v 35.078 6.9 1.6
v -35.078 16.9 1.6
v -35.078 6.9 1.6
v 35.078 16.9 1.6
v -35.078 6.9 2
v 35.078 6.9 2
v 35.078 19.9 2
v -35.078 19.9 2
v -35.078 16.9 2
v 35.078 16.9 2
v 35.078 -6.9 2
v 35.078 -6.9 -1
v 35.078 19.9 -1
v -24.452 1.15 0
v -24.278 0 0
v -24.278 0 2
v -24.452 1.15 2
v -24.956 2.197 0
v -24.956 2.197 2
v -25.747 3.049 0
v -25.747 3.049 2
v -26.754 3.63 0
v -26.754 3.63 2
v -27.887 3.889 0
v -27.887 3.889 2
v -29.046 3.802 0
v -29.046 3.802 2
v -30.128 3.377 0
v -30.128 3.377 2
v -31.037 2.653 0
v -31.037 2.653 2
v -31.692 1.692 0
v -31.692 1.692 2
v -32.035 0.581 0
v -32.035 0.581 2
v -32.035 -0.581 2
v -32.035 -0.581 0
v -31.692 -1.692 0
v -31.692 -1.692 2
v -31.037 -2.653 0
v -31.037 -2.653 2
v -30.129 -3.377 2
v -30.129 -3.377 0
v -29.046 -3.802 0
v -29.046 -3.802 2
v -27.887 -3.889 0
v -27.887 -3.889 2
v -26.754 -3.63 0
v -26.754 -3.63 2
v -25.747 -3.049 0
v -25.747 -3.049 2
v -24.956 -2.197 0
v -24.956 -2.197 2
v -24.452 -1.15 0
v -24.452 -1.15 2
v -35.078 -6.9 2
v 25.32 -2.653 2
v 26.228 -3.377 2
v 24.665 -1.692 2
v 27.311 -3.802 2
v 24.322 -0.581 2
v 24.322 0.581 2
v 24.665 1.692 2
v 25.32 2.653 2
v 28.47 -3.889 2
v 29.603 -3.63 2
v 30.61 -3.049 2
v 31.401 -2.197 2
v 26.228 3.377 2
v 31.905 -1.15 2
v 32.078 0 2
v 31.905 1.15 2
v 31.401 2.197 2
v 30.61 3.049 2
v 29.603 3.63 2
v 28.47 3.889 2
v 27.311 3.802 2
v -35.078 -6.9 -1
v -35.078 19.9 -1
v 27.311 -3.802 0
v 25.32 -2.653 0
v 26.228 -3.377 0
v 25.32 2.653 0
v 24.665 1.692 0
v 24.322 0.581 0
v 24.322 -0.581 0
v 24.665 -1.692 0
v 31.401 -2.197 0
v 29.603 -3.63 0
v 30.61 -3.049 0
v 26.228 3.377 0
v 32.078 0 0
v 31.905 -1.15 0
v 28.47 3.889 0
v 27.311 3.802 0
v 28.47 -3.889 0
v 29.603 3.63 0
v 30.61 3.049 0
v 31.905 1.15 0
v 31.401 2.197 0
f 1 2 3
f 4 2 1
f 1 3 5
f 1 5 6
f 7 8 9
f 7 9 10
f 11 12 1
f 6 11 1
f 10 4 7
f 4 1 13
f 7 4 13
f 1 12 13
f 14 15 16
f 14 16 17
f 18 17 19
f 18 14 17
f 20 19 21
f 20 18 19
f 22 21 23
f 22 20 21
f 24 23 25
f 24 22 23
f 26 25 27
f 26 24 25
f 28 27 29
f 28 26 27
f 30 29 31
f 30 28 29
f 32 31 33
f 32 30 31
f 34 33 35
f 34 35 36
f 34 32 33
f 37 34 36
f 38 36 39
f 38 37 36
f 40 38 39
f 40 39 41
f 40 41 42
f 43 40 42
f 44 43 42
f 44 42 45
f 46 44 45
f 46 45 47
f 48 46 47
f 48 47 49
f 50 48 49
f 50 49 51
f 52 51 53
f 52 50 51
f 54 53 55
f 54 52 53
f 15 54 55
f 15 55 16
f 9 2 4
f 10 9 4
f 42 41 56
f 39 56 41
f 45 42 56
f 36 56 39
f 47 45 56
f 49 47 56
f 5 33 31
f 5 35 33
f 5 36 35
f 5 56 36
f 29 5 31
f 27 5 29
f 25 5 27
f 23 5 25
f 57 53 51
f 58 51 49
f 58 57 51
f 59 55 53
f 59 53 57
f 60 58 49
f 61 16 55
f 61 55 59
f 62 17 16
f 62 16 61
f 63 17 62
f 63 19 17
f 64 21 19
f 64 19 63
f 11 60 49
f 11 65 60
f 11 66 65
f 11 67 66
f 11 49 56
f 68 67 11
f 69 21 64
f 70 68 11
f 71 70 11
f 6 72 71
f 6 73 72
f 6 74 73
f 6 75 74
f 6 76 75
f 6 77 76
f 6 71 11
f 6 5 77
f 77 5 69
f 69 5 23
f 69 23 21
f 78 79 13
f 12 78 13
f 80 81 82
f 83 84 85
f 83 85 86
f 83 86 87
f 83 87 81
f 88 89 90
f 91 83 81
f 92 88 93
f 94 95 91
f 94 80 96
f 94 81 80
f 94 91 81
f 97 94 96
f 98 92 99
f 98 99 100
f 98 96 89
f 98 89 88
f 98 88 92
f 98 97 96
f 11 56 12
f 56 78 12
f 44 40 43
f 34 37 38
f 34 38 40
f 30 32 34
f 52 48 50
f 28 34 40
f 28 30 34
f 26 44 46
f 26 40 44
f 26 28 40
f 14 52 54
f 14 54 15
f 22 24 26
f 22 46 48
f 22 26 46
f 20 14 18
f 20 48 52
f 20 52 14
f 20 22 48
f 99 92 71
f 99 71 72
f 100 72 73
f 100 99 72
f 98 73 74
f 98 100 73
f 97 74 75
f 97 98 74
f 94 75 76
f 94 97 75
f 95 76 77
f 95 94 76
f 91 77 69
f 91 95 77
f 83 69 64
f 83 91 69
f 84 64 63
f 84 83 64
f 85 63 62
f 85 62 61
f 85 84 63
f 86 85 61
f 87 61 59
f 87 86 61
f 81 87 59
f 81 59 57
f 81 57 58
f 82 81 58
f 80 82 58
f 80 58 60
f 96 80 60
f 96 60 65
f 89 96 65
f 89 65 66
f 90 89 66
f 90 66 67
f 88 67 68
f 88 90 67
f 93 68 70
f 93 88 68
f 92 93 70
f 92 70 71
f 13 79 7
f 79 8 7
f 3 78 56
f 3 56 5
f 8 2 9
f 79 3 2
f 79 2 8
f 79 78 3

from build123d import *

# Parameters (mm, degrees)
F1_W     = 70.157
F1_H     = 26.8
F2_DEPTH = 1
F0_W     = 70.157
F0_H     = 13.8
F0_R     = 3.9
F0_H_2   = 3
F3_DEPTH = 2
F0_H_3   = 10
F4_DEPTH = 1.6


with BuildPart() as f2:
    # F1 (on Top) → F2 (new body)
    with BuildSketch(Plane.XY):
        with Locations((0, 6.5)):
            Rectangle(F1_W, F1_H)
    extrude(amount=-F2_DEPTH)

    # F0 (on Top) → F3 (join)
    with BuildSketch(Plane.XY):
        Rectangle(F0_W, F0_H)
        with Locations((-28.1785, 0)):
            Circle(F0_R, mode=Mode.SUBTRACT)
        with Locations((28.1785, 0)):
            Circle(F0_R, mode=Mode.SUBTRACT)
        with Locations((0, 18.4)):
            Rectangle(F0_W, F0_H_2)
    extrude(amount=F3_DEPTH)

    # F0 (on Top) → F4 (join)
    with BuildSketch(Plane.XY):
        with Locations((0, 11.9)):
            Rectangle(F0_W, F0_H_3)
    extrude(amount=F4_DEPTH)


solid = f2.part
